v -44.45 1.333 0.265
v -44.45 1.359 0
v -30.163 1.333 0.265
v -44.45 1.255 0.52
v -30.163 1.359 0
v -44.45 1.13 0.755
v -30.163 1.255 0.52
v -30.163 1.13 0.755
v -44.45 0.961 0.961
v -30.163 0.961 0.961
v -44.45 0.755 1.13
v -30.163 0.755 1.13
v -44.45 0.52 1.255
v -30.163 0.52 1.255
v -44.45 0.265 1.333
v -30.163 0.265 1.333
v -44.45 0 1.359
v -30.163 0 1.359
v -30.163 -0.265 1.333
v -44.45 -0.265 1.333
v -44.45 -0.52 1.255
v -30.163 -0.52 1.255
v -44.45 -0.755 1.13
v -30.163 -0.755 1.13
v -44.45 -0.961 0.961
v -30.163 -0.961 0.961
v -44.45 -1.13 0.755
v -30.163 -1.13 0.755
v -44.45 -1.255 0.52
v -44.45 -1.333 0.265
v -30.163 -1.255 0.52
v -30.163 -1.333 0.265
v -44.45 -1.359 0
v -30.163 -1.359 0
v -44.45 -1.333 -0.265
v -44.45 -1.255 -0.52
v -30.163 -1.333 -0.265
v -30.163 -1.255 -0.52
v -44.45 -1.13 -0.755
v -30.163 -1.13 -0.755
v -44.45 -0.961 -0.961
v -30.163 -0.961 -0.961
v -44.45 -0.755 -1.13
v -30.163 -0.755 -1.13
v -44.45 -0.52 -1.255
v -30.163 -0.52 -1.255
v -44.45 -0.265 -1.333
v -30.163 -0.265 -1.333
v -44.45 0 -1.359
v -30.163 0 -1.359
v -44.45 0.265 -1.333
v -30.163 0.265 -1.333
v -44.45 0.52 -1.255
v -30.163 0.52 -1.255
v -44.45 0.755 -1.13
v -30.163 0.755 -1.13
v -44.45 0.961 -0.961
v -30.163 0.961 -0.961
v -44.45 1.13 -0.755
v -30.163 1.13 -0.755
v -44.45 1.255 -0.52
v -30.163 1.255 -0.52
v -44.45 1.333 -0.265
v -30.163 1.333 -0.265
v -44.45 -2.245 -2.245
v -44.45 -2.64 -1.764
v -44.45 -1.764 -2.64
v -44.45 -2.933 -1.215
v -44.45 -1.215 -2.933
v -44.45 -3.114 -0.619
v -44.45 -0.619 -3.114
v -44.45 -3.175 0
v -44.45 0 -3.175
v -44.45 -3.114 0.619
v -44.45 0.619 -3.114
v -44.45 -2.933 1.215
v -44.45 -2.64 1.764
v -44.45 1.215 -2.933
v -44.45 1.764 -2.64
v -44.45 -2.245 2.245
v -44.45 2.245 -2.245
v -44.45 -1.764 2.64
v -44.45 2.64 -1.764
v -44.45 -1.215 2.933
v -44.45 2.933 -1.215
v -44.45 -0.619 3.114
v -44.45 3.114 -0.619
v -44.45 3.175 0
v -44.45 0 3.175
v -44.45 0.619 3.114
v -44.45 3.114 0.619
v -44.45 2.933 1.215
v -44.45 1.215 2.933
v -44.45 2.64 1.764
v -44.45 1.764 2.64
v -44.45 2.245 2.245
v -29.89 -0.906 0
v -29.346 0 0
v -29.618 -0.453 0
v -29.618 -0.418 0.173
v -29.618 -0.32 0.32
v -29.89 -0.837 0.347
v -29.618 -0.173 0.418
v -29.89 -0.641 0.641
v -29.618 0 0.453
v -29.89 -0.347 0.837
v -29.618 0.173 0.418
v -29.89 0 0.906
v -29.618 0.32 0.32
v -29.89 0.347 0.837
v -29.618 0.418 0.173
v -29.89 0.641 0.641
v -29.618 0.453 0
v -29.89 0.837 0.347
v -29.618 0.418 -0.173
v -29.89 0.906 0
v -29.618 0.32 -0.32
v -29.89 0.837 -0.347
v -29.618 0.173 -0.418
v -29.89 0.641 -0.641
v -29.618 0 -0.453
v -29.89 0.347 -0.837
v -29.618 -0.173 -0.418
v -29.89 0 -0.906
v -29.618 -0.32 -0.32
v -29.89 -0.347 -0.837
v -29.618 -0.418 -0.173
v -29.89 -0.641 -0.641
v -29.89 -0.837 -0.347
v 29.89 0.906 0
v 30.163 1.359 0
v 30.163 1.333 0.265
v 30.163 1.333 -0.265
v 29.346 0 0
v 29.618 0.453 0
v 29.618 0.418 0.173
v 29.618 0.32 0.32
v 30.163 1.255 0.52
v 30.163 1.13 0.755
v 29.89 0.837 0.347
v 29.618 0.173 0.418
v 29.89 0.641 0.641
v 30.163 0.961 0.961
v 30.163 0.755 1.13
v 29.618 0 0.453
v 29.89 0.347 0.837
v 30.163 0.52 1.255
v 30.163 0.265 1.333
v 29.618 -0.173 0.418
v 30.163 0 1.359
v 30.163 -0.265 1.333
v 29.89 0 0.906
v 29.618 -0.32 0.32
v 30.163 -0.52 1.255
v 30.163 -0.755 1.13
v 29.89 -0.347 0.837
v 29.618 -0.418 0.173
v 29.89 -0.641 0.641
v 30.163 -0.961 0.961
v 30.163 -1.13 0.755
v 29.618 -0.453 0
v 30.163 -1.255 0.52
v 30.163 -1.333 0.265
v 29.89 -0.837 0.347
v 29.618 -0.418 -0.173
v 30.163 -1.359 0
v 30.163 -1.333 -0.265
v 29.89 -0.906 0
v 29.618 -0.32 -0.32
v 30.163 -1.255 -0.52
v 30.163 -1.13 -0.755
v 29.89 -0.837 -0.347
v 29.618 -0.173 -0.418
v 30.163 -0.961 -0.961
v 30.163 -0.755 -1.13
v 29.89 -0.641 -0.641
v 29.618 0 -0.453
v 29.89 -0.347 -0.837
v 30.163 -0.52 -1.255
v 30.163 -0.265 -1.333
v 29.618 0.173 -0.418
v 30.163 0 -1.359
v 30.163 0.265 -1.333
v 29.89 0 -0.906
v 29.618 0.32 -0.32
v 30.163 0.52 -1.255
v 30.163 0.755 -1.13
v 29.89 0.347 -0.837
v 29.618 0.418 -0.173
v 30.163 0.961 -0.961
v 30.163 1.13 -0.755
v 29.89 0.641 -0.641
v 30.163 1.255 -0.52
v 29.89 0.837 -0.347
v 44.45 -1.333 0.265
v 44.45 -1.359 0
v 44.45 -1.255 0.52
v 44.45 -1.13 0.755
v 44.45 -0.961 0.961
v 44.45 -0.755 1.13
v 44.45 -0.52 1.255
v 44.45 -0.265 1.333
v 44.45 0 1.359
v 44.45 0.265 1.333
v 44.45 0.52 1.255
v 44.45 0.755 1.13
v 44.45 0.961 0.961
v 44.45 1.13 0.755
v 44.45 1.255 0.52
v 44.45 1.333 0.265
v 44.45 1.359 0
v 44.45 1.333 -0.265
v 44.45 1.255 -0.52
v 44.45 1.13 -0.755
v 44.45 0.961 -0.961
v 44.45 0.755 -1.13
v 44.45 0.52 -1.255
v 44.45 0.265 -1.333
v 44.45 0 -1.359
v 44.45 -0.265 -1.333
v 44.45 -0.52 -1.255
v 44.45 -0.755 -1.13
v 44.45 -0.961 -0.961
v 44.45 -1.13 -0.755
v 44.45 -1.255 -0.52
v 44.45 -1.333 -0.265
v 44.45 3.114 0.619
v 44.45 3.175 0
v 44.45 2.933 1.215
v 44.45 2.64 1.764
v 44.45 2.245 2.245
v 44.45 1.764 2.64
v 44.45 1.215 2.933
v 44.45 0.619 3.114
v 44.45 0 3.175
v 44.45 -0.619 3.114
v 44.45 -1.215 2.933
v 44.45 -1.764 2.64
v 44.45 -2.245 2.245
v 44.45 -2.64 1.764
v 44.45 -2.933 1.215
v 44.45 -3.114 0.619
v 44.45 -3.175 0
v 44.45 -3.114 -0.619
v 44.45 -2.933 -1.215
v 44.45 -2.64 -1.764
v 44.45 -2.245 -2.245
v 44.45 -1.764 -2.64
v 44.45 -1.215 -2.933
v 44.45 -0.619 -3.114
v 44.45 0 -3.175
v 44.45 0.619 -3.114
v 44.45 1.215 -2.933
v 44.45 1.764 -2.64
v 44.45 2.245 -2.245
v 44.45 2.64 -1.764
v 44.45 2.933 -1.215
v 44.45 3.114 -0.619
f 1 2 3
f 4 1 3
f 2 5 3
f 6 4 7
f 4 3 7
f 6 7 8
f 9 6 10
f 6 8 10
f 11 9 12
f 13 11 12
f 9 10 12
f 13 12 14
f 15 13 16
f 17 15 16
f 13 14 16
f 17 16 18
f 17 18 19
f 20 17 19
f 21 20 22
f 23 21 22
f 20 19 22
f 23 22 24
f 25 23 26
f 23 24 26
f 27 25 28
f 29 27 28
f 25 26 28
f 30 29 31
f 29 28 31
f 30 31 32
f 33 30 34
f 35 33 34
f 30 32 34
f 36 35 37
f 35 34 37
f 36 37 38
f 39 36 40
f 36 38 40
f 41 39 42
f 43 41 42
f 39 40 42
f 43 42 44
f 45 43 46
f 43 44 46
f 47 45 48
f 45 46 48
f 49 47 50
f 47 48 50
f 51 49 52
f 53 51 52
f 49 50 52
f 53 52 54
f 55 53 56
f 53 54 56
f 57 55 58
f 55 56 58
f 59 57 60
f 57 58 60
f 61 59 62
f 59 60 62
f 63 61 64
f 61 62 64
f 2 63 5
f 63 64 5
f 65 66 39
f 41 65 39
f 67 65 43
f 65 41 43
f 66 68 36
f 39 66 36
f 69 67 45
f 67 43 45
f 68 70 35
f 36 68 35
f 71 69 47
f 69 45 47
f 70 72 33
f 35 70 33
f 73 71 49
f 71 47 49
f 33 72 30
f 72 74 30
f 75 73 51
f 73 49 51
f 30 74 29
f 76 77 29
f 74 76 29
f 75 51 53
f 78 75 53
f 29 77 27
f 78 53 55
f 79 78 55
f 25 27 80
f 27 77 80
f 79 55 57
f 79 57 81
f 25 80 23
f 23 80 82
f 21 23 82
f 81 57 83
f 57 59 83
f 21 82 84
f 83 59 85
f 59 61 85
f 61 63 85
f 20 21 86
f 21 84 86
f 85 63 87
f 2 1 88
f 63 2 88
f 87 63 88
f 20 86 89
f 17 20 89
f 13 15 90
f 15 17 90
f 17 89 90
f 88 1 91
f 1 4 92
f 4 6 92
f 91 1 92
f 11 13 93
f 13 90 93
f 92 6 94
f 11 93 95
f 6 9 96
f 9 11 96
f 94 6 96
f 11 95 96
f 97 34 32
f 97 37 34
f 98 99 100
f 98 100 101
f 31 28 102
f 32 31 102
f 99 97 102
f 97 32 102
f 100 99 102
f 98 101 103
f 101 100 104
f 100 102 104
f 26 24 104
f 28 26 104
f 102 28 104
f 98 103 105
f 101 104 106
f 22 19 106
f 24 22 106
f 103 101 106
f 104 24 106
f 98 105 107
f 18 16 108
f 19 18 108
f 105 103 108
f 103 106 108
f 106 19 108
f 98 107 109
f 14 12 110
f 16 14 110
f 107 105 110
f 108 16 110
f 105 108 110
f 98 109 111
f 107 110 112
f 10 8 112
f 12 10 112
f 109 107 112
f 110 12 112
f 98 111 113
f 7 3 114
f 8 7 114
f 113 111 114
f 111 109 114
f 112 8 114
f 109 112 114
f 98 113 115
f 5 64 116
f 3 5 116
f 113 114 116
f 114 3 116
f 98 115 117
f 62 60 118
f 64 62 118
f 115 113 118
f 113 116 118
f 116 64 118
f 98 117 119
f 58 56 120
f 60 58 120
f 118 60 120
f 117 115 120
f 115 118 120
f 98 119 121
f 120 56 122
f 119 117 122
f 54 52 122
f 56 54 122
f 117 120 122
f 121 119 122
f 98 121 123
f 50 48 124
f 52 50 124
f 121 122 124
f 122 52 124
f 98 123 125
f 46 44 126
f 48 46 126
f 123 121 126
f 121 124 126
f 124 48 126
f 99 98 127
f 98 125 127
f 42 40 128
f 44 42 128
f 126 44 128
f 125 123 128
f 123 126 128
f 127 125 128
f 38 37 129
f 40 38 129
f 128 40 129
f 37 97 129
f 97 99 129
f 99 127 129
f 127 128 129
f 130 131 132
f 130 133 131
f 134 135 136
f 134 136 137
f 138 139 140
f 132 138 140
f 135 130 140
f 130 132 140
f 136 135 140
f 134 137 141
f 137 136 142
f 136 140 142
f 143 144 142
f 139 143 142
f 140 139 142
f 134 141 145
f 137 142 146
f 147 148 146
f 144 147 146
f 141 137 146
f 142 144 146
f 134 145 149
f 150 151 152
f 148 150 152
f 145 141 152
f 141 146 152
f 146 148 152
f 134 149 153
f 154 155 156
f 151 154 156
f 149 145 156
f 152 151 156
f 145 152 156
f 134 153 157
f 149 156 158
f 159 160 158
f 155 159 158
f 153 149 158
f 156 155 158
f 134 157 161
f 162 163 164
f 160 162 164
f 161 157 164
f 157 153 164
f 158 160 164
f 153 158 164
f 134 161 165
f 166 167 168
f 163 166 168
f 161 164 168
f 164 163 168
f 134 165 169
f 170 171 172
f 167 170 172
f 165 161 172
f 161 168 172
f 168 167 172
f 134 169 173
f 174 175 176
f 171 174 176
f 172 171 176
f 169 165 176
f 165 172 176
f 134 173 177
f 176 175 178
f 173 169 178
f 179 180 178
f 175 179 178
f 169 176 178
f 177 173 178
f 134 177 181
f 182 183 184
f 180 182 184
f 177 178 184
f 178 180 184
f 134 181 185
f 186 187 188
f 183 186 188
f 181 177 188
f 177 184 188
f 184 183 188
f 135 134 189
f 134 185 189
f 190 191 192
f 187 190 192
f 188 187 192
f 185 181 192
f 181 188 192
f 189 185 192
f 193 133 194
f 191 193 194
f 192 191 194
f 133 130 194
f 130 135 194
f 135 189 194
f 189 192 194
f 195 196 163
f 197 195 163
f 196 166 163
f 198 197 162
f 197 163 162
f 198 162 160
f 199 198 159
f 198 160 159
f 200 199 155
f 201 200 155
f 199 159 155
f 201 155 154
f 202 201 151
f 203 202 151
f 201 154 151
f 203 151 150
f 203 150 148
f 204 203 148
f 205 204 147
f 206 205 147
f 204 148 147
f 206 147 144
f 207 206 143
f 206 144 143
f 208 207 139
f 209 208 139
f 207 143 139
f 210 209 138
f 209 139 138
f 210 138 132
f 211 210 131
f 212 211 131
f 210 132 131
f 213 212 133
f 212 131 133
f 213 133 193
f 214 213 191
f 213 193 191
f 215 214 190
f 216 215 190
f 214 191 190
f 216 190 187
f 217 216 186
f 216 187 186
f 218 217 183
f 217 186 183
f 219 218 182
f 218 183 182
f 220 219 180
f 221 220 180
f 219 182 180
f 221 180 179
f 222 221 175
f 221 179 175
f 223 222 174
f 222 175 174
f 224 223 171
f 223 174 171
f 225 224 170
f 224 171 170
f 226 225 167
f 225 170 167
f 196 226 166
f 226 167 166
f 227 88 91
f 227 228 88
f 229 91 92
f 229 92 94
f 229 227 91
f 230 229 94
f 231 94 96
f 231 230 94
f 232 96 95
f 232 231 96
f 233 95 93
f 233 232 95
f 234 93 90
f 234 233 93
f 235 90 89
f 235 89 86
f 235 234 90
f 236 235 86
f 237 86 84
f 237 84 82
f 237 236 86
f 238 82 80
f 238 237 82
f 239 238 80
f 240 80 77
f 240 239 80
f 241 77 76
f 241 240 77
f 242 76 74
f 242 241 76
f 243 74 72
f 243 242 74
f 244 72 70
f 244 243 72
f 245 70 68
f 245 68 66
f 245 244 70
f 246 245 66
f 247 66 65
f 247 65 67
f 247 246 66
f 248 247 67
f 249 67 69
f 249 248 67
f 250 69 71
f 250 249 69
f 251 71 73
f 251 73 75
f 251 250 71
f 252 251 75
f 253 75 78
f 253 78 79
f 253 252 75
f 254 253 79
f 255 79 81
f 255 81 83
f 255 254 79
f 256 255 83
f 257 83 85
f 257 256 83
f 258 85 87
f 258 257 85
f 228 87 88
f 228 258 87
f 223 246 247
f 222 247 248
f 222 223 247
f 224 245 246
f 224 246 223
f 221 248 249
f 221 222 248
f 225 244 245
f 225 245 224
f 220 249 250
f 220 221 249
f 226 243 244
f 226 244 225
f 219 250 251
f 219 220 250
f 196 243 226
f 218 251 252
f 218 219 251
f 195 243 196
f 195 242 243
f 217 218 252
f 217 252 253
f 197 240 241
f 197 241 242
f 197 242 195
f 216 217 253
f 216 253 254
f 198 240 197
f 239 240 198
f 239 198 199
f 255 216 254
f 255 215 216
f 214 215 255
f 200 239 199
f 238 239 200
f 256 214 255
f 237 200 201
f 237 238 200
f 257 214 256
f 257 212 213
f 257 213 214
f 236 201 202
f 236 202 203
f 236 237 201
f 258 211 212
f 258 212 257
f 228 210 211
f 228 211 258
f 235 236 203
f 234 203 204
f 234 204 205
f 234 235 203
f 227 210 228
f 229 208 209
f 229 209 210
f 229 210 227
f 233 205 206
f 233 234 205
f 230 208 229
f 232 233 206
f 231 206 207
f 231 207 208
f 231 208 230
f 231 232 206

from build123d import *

# Parameters (mm, degrees)
F0_R           = 3.175
F1_DEPTH       = 44.45
F4_D           = 2.7178
F4_DEPTH       = 14.2875
F4_TIP         = 0.8165094952
F4_ON_F2_D     = 2.7178
F4_ON_F2_DEPTH = 14.2875
F4_ON_F2_TIP   = 0.8165094952


with BuildPart() as f1:
    # F0 (on Right) → F1 (new body, symmetric)
    with BuildSketch(Plane.YZ):
        Circle(F0_R)
    extrude(amount=F1_DEPTH, both=True)

    # F4
    with Locations(Plane(origin=(-44.45, 0, 0), x_dir=(0, -1, 0), z_dir=(-1, 0, 0))):
        with Locations((0, 0)):
            Hole(F4_D / 2, depth=F4_DEPTH)
            with Locations((0, 0, -(F4_DEPTH + F4_TIP / 2))):  # 118° drill point
                Cone(0, F4_D / 2, F4_TIP, mode=Mode.SUBTRACT)

    # F4 on F2
    with Locations(Plane.YZ.offset(44.45)):
        with Locations((0, 0)):
            Hole(F4_ON_F2_D / 2, depth=F4_ON_F2_DEPTH)
            with Locations((0, 0, -(F4_ON_F2_DEPTH + F4_ON_F2_TIP / 2))):  # 118° drill point
                Cone(0, F4_ON_F2_D / 2, F4_ON_F2_TIP, mode=Mode.SUBTRACT)


solid = f1.part
